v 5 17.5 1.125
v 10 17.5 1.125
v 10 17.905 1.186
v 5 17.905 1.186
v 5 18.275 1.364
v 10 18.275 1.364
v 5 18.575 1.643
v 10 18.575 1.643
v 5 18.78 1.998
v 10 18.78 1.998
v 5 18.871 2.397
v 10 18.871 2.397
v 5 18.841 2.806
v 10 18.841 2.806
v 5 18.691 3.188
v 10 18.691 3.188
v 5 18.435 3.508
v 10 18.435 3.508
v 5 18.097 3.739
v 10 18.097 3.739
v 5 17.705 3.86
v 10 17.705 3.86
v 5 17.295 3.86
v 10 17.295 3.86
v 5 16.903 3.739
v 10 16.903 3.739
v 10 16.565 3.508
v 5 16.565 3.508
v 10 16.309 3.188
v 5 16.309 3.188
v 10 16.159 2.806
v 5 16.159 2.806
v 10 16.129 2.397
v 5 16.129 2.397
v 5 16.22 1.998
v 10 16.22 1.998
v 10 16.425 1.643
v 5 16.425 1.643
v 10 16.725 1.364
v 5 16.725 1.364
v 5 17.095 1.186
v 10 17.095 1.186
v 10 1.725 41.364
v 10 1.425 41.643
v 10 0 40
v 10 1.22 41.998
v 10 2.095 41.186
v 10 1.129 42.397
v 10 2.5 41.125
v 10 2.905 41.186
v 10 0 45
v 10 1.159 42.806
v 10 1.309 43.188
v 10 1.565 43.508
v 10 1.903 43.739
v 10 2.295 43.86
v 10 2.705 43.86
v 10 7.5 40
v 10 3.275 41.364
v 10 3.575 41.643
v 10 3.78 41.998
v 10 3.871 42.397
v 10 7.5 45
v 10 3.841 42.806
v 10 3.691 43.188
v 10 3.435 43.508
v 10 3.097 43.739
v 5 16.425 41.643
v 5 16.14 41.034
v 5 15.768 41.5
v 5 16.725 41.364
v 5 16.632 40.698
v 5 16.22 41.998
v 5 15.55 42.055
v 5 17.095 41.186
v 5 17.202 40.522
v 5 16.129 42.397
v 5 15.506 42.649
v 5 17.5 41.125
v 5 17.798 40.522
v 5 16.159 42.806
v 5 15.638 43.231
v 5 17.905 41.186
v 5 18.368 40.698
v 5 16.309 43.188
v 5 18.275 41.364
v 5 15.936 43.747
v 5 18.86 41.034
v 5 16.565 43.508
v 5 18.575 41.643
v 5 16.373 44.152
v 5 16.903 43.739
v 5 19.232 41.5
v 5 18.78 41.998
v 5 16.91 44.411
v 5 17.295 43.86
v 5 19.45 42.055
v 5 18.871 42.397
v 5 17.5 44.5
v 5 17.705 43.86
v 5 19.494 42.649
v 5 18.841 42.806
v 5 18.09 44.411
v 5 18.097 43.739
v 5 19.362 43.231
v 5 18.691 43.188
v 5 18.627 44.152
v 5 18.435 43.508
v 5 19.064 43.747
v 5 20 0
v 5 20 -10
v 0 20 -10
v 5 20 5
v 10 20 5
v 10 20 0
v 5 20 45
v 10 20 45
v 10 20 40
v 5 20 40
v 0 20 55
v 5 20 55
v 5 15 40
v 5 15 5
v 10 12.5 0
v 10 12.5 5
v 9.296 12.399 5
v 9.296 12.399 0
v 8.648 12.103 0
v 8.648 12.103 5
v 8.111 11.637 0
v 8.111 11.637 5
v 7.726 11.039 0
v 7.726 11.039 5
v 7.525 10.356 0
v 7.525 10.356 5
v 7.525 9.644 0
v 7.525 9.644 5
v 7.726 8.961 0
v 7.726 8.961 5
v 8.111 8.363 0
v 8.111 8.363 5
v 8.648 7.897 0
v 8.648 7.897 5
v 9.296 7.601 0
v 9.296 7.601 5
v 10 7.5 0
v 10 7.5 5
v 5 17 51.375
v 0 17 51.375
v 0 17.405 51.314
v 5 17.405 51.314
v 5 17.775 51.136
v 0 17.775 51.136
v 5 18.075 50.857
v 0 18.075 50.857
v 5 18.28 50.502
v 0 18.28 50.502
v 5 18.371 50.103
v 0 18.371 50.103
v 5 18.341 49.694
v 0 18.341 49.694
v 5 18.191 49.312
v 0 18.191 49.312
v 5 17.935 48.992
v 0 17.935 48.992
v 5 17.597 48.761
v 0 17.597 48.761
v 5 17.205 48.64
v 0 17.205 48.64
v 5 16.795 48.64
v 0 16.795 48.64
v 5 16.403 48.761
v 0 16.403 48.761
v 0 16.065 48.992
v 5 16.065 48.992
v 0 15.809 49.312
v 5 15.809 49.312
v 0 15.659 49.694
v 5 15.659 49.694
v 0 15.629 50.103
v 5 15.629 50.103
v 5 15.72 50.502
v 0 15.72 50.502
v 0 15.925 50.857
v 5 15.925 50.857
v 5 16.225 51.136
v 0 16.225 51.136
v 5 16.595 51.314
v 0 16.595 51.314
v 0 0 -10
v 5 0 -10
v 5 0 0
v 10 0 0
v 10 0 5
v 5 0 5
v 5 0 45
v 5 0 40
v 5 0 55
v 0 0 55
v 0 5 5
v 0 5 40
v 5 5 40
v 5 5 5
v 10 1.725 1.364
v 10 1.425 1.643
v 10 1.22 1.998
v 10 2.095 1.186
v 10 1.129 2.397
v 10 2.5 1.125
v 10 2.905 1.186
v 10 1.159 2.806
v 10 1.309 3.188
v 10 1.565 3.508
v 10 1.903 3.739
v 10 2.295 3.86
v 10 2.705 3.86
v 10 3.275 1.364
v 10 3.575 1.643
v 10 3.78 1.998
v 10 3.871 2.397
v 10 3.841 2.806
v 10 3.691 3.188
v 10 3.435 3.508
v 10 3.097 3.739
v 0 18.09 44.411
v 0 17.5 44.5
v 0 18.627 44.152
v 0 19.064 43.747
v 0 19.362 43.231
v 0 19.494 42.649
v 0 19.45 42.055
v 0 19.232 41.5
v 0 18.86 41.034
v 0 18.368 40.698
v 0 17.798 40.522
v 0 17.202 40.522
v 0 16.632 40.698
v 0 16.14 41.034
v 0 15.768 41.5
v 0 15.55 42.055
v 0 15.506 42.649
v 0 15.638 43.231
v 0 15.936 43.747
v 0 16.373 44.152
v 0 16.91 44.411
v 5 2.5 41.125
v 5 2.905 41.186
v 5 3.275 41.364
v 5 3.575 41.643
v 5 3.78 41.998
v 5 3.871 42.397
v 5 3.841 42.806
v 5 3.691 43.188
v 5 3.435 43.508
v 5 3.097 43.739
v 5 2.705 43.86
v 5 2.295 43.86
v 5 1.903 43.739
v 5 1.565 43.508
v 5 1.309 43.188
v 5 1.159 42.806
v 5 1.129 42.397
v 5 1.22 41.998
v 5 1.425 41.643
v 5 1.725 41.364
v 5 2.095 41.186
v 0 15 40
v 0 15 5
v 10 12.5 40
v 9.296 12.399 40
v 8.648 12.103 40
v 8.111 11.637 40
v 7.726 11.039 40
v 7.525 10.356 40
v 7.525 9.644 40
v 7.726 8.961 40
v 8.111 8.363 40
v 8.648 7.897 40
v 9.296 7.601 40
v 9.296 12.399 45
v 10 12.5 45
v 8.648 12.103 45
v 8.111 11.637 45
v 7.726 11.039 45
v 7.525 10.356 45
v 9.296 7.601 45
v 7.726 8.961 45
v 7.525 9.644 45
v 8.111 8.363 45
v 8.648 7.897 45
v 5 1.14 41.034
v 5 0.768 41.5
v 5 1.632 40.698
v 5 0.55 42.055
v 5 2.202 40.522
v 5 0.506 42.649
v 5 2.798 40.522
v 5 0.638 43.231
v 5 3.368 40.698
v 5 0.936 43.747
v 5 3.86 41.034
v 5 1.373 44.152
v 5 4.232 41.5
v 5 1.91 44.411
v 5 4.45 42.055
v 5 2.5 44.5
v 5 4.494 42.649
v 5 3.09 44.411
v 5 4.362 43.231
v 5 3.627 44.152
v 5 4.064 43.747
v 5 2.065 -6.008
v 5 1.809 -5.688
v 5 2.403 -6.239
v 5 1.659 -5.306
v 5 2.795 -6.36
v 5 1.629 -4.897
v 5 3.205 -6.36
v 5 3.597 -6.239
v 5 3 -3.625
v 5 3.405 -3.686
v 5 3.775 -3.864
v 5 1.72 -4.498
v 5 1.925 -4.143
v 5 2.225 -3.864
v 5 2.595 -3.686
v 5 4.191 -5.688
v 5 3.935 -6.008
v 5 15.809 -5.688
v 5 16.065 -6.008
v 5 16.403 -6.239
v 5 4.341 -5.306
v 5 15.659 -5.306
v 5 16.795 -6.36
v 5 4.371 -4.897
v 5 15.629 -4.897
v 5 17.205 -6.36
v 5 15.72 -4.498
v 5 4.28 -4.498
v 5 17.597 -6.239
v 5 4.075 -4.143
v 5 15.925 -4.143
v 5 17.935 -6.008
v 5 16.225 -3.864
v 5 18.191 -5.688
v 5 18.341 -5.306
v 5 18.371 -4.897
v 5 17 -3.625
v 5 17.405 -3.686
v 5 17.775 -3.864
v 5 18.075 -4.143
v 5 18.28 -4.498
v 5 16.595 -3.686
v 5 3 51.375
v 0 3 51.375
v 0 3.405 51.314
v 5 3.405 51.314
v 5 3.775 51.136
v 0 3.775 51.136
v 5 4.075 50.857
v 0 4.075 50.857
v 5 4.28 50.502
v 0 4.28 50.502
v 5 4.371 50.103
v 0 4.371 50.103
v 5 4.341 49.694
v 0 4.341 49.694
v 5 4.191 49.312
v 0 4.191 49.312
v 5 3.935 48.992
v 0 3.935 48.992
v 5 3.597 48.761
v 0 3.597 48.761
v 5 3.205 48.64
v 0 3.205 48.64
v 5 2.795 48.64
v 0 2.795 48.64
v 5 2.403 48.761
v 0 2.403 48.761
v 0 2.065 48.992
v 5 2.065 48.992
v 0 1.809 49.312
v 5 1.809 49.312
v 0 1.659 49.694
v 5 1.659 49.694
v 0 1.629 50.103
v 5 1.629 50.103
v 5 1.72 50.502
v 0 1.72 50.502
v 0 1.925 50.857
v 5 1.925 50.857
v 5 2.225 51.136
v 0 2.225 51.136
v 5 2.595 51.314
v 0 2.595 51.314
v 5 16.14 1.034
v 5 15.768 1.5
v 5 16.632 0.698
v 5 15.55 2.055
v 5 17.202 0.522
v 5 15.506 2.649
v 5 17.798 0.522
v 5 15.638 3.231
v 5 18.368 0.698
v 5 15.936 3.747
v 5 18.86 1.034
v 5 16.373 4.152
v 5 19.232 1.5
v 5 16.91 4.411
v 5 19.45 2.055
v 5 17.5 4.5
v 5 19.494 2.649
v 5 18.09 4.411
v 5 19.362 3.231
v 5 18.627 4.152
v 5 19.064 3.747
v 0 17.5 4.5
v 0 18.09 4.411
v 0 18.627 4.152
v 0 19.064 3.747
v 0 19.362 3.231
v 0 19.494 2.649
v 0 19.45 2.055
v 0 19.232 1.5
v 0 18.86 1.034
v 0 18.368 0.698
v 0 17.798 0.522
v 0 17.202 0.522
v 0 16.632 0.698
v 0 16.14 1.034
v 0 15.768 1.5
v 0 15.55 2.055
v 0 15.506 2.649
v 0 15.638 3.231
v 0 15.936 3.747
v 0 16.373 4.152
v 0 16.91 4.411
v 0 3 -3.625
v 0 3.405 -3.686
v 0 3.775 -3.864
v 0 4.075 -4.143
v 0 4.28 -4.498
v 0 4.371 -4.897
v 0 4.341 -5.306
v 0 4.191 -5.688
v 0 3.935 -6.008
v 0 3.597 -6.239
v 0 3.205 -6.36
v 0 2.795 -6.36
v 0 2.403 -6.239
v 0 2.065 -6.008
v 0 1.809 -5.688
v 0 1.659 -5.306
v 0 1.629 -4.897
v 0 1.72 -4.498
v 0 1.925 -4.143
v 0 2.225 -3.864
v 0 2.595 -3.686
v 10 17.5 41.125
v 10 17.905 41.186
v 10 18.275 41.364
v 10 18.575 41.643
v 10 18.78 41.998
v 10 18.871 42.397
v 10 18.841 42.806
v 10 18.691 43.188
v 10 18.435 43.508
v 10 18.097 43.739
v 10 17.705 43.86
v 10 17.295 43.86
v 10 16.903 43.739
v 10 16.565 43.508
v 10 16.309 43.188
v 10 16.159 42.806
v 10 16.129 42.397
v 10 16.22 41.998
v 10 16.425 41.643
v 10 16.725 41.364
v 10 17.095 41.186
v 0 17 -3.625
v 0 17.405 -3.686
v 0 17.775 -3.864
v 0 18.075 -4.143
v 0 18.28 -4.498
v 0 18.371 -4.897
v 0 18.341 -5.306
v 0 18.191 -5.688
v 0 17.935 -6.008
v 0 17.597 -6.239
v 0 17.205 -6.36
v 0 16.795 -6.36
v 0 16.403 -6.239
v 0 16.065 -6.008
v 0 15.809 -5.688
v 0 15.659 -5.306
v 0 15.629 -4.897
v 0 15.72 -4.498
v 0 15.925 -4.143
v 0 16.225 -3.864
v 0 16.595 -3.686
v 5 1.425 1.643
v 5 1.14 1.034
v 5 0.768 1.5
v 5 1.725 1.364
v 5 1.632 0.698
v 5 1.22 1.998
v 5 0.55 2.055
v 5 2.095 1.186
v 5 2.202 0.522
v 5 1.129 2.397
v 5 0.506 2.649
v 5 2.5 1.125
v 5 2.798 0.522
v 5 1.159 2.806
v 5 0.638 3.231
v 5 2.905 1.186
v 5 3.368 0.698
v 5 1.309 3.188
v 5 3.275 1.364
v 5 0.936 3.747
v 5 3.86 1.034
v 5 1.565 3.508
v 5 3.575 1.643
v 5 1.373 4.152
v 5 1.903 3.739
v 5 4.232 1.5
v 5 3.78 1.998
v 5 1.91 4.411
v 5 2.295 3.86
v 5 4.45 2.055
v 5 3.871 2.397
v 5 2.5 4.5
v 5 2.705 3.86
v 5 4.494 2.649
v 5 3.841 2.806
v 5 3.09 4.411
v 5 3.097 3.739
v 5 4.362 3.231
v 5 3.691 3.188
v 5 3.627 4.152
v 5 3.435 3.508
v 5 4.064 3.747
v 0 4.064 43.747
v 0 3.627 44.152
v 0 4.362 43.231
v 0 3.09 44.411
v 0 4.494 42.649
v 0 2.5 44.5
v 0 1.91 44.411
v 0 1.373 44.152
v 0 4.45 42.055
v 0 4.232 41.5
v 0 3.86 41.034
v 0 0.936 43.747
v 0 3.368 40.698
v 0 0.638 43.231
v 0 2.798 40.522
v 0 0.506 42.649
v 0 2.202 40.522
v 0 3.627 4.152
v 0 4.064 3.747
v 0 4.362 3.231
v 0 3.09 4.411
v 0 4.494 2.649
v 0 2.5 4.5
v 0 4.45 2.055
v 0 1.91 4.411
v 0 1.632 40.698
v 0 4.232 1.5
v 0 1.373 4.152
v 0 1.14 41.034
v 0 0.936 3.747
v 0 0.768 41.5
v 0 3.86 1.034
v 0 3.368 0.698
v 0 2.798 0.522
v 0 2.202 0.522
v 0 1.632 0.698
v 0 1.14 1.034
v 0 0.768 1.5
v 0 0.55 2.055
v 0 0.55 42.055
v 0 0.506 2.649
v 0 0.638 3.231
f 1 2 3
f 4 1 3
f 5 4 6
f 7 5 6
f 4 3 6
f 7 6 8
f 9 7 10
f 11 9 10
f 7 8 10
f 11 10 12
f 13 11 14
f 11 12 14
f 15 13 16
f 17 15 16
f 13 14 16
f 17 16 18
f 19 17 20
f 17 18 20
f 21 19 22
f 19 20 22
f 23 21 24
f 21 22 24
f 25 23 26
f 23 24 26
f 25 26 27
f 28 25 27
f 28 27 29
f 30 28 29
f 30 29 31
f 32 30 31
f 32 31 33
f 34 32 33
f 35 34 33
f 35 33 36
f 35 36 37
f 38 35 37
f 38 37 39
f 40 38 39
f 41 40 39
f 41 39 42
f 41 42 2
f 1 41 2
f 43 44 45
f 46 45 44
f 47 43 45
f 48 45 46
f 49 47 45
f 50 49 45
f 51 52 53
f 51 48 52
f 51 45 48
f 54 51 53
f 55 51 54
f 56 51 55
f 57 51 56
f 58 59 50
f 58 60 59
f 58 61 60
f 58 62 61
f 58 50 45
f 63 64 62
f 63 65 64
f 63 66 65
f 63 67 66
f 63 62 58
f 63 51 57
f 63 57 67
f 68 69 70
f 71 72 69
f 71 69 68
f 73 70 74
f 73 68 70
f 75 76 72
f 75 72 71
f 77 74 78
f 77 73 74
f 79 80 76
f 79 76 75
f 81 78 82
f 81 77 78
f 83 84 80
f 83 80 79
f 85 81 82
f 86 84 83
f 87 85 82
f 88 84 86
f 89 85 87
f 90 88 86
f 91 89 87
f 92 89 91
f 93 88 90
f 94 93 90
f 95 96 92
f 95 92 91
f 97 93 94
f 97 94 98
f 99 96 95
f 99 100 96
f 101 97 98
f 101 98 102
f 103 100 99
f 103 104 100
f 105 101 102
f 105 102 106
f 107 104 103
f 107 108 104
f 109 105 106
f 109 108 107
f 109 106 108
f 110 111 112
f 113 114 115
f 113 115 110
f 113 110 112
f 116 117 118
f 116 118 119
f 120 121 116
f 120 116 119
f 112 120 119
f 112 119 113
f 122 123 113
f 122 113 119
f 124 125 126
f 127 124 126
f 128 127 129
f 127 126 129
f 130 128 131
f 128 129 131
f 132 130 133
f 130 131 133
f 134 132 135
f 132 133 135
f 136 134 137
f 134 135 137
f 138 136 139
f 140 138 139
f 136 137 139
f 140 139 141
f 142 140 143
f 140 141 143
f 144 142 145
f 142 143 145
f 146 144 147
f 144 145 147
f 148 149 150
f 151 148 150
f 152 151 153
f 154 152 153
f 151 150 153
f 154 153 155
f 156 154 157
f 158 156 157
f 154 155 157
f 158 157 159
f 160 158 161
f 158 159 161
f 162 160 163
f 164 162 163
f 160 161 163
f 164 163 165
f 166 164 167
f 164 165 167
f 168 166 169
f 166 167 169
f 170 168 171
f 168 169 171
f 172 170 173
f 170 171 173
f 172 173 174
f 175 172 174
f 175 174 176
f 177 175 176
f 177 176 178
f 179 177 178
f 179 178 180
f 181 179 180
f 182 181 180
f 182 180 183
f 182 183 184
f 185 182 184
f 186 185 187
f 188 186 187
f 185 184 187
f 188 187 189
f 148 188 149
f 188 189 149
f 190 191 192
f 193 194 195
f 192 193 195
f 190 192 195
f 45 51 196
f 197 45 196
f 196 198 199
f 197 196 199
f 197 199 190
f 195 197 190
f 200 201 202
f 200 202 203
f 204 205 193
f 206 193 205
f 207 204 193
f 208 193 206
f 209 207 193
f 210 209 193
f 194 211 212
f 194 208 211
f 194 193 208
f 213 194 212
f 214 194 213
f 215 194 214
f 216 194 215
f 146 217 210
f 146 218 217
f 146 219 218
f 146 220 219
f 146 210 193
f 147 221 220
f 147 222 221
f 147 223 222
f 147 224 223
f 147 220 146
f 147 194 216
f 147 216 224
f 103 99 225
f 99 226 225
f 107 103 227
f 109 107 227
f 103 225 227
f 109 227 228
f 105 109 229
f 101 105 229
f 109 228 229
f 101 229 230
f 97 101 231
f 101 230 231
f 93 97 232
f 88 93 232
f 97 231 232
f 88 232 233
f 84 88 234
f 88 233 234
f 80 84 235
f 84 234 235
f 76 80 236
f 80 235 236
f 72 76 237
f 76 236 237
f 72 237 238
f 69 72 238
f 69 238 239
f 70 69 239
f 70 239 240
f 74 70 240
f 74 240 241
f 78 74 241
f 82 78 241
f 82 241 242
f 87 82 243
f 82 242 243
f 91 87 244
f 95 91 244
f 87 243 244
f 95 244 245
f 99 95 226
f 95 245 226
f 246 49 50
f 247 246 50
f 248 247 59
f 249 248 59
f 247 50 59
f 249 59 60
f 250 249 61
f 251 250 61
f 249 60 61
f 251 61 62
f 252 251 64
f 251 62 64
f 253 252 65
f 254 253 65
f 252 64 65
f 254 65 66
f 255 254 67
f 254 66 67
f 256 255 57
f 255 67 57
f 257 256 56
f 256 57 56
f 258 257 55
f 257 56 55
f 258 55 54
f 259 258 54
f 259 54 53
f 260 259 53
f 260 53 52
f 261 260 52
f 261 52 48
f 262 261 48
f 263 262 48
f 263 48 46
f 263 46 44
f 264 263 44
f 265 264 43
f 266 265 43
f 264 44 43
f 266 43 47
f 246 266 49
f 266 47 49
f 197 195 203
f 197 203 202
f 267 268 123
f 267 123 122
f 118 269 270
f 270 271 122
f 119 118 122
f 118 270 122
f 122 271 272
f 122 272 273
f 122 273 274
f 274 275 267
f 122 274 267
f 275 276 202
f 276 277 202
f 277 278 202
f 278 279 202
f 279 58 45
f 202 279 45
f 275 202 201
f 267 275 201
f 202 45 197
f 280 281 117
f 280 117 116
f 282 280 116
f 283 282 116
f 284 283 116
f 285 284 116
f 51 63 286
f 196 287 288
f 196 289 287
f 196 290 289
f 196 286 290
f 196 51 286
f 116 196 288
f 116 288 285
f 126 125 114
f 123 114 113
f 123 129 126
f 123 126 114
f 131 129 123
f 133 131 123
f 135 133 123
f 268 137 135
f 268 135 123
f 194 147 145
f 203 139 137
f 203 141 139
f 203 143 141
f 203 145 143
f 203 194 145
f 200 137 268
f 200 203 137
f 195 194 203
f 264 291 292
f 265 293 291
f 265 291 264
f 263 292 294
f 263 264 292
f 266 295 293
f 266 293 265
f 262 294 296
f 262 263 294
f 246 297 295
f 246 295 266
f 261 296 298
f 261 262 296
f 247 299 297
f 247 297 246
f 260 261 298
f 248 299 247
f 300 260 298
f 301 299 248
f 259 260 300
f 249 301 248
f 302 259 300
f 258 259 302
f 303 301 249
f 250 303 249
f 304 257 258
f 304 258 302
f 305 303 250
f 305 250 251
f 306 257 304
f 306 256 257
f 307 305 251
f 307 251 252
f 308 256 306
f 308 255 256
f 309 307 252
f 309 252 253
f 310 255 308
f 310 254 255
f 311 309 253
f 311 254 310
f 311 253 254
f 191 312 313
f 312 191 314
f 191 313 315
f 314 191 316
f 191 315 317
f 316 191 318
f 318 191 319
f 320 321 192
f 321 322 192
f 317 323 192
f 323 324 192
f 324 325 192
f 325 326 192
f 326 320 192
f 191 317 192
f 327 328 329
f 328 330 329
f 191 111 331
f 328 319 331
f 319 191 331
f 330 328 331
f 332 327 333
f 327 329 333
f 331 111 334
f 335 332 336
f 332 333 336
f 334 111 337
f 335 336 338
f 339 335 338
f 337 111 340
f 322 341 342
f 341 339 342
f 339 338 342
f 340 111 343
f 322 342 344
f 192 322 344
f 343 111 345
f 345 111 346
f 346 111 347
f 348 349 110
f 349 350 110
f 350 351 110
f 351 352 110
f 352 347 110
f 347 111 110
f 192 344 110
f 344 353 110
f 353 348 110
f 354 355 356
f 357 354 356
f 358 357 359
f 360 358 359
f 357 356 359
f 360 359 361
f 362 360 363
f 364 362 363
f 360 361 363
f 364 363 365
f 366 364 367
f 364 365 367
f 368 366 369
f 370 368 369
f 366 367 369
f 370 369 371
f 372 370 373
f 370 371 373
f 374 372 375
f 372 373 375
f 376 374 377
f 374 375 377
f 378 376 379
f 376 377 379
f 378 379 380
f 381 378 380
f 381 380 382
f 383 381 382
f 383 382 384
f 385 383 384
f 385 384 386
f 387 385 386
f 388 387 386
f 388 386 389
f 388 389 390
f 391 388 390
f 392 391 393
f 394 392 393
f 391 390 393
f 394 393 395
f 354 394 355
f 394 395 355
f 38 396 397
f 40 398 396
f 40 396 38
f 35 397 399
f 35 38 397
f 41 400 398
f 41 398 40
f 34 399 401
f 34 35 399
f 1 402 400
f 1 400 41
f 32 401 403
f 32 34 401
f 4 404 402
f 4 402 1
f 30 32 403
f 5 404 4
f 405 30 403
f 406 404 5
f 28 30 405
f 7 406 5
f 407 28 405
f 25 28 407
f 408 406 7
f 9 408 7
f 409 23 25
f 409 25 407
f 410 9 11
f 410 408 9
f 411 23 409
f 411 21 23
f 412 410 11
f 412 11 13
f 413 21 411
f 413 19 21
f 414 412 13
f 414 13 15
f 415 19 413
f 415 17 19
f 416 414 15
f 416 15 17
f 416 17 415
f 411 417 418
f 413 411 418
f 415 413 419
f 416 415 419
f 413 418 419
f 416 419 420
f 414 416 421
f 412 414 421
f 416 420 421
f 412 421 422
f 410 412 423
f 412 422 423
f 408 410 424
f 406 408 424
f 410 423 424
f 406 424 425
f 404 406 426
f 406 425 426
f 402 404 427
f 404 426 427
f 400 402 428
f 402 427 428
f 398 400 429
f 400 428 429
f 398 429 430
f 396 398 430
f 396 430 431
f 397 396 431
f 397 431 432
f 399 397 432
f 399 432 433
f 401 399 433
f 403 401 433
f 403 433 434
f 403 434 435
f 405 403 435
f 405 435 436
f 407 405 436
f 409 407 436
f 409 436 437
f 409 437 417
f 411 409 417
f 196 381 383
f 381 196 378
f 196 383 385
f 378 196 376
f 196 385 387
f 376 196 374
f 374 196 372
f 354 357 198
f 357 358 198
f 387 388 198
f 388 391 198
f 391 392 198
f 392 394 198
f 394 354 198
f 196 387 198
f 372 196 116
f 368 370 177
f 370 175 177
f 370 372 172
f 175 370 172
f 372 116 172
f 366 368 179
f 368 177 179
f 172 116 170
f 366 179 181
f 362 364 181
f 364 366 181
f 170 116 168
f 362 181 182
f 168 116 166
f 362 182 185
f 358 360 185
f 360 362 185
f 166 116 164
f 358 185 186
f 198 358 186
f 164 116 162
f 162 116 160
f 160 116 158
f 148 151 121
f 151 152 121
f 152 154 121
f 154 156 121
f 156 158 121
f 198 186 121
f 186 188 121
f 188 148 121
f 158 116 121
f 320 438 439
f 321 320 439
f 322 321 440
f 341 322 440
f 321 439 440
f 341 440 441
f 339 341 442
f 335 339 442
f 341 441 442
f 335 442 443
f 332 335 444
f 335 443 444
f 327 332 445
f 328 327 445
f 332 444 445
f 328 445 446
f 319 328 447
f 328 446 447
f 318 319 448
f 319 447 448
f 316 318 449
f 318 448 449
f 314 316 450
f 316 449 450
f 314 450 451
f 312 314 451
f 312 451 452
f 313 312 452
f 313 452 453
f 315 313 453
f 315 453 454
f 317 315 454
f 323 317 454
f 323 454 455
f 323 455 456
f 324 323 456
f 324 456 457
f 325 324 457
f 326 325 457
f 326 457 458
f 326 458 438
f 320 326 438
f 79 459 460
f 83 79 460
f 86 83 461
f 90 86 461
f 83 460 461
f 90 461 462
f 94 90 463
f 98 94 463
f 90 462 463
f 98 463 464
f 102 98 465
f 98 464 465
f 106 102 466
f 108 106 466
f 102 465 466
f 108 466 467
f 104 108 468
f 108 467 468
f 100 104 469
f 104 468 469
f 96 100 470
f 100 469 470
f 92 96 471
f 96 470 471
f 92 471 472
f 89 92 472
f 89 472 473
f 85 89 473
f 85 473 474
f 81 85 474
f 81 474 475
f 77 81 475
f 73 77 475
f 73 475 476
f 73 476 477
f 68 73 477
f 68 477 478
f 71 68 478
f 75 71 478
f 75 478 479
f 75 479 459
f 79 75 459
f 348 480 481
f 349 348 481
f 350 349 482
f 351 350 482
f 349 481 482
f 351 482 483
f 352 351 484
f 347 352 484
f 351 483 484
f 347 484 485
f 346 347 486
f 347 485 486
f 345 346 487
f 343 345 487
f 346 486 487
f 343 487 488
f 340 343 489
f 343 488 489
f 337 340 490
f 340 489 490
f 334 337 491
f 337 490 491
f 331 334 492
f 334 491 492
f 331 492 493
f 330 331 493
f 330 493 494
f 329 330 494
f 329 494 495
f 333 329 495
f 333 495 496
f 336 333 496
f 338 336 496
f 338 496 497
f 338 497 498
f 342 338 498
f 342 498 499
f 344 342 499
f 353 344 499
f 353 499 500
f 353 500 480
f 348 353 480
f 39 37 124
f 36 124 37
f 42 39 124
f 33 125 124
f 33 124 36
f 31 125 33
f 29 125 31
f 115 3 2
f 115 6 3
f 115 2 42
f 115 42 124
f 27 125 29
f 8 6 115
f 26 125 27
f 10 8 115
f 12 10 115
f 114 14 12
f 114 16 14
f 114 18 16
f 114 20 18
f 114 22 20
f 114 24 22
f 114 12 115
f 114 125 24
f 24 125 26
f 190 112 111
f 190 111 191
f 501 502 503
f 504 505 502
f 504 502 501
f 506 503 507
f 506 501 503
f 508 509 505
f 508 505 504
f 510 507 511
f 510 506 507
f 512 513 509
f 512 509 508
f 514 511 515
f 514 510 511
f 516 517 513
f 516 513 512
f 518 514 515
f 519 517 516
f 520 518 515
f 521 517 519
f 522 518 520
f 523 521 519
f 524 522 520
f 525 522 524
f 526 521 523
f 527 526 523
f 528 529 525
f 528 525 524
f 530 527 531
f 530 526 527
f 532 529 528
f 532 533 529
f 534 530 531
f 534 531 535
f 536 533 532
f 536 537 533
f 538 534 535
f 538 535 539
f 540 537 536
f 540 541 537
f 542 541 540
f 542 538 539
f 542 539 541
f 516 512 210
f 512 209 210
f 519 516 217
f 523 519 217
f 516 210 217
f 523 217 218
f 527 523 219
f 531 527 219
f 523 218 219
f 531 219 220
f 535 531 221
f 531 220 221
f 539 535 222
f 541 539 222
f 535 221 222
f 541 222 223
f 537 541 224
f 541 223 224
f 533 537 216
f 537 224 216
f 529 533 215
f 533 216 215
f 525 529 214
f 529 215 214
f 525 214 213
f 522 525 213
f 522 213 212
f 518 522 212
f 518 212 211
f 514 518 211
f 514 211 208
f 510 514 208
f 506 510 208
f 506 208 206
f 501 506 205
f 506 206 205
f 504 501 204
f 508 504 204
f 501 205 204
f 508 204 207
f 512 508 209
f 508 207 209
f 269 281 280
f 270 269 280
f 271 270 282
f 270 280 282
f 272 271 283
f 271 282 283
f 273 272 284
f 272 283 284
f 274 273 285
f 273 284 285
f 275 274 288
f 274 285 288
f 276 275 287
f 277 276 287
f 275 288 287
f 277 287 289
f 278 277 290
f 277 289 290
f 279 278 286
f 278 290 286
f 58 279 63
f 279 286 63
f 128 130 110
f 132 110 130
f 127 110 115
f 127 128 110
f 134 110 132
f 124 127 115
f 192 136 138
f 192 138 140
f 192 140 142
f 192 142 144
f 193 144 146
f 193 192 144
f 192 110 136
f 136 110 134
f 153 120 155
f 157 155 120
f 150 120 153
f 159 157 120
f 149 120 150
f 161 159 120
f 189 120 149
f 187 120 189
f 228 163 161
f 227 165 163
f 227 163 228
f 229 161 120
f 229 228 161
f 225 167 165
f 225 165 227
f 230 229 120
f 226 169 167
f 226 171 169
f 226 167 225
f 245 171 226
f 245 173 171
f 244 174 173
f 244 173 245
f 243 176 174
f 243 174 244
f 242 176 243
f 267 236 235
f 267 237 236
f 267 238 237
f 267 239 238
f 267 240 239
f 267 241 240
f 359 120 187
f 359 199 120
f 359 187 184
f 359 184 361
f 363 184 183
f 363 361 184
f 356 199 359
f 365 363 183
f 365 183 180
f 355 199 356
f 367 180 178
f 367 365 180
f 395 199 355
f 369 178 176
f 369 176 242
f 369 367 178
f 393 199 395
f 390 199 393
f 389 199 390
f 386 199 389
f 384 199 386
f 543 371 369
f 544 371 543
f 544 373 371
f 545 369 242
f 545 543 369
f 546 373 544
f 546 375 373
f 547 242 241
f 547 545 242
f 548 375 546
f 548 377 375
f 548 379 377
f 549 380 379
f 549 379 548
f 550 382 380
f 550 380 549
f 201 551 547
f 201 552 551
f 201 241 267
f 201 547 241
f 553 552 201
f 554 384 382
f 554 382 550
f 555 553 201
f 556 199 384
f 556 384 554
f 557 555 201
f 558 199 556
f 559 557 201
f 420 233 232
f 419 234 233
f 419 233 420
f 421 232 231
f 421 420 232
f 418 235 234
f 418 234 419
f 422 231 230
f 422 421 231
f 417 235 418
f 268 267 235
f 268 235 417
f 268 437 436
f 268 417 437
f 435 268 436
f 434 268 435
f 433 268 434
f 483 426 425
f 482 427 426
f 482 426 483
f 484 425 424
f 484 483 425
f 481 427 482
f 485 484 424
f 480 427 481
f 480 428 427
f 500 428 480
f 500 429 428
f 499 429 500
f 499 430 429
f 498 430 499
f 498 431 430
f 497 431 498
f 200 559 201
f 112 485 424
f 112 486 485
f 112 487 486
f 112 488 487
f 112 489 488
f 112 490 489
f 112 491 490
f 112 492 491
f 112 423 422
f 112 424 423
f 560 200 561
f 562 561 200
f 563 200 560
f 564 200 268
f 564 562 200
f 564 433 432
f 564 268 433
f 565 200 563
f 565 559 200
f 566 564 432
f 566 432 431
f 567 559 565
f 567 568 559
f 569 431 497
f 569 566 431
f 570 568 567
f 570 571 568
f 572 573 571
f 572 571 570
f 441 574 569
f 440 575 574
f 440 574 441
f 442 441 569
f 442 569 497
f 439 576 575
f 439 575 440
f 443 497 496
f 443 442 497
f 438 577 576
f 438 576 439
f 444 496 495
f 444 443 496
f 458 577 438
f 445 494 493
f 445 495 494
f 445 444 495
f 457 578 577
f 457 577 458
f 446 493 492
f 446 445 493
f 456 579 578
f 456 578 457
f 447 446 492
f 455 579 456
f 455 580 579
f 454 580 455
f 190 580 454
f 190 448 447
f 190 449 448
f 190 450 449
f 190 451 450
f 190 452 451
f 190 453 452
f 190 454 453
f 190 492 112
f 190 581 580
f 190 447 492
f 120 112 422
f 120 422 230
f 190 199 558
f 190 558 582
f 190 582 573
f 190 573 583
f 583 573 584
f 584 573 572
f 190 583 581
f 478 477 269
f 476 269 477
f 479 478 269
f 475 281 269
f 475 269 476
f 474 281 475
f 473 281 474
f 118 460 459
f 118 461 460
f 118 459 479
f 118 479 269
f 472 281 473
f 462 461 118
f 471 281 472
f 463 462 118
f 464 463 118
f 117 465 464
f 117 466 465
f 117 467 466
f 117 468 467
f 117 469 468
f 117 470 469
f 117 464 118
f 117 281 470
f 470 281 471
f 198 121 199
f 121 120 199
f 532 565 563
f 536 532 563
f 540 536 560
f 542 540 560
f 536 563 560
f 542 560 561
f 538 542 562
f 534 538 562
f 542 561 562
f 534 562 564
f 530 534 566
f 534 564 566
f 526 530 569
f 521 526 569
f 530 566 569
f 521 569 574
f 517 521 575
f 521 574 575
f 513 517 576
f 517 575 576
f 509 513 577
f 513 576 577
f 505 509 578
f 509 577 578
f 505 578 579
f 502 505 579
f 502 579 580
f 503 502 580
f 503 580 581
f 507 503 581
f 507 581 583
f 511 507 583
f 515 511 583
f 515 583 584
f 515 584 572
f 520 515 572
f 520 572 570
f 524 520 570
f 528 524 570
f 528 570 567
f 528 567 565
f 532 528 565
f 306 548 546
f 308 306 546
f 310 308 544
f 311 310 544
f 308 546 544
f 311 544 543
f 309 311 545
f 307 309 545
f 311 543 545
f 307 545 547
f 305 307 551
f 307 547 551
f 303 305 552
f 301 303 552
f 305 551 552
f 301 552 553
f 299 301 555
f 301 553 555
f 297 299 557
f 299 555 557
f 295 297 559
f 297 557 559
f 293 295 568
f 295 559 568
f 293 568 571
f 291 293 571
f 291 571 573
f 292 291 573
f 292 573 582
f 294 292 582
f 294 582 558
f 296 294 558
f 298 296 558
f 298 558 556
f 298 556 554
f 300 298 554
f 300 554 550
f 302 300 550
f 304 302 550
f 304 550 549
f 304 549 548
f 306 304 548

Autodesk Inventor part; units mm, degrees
ref_plane "YZ Plane" through (0, 0, 0) normal (1, 0, 0) x (0, 1, 0)
ref_plane "XZ Plane" through (0, 0, 0) normal (0, 1, 0) x (-1, 0, 0)
ref_plane "XY Plane" through (0, 0, 0) normal (0, 0, 1) x (1, 0, 0)
sketch "Sketch1" plane through (0, 0, 0) normal (0, 1, 0) x (-1, 0, 0)
  line L0 (0, 0) -> (-5, 0)
  line L1 (-5, 0) -> (-5, 45)
  line L2 (-5, 45) -> (0, 45)
  line L3 (0, 45) -> (0, 0)
  line L4 (-5, 45) -> (-20, 45)
  line L5 (-20, 45) -> (-20, 40)
  line L6 (-20, 40) -> (-5, 40)
  line L7 (-5, 40) -> (-5, 45)
  line L8 (-5, 0) -> (-20, 0)
  line L9 (-20, 0) -> (-20, 5)
  line L10 (-20, 5) -> (-5, 5)
  line L11 (-5, 5) -> (-5, 0)
  point P0 (-5, 40)
  point P1 (-5, 5)
  dimension "d0" = 5
  dimension "d1" = 5
  dimension "d2" = 5
  dimension "d3" = 15
  dimension "d4" = 15
  dimension "d5" = 35
extrude "Extrusion1" add sketch "Sketch1" along normal blind 20
sketch "Sketch2" plane through (0, 0, 45) normal (0, 0, 1) x (1, 0, 0)
  circle A0 centre (10, 10) radius 2.5
  line L0 (20, 0) -> (20, 20) projected
  line L1 (20, 0) -> (10, 0)
  line L2 (10, 0) -> (10, 20)
  line L3 (10, 20) -> (20, 20)
  line L4 (20, 20) -> (20, 0)
  line L5 (0, 0) -> (20, 0) projected
  dimension "d8" = 10
  dimension "d9" = 10
  dimension "d10" = 10
  dimension "d11" = 5
extrude "Extrusion2" cut sketch "Sketch2" against normal blind 200
sketch "Sketch3" plane through (0, 0, 0) normal (-1, 0, 0) x (0, 0, 1)
  line L0 (5, 0) -> (5, 20) projected
  line L1 (40, 0) -> (40, 20) projected
  line L2 (5, 15) -> (40, 15)
  line L3 (40, 15) -> (40, 5)
  line L4 (40, 5) -> (5, 5)
  line L5 (5, 5) -> (5, 15)
  line L6 (0, 20) -> (45, 20) projected
  line L7 (0, 0) -> (45, 0) projected
  point P0 (5, 5)
  dimension "d14" = 5
  dimension "d15" = 5
extrude "Extrusion3" cut sketch "Sketch3" against normal blind 20 contours L0 L2 L1 L4
sketch "Sketch4" plane through (0, 0, 0) normal (-1, 0, 0) x (0, 0, 1)
  line L0 (45, 0) -> (45, 20) projected
  line L1 (45, 20) -> (55, 20)
  line L2 (55, 20) -> (55, 0)
  line L3 (55, 0) -> (45, 0)
  line L4 (45, 0) -> (45, 20)
  line L5 (0, 20) -> (0, 12.5) projected
  line L6 (0, 20) -> (-10, 20)
  line L7 (-10, 20) -> (-10, 0)
  line L8 (-10, 0) -> (0, 0)
  line L9 (0, 0) -> (0, 20)
  circle A0 centre (50, 3) radius 1.375
  circle A1 centre (50, 17) radius 1.375
  circle A2 centre (-5, 17) radius 1.375
  circle A3 centre (-5, 3) radius 1.375
  point P0 (0, 0)
  point P1 (50, 20)
  point P2 (0, 12.5)
  dimension "d18" = 10
  dimension "d19" = 10
  dimension "d20" = 3
  dimension "d21" = 3
  dimension "d22" = 5
  dimension "d23" = 5
  dimension "d24" = 5
  dimension "d25" = 5
  dimension "d26" = 3
  dimension "d27" = 3
  dimension "d28" = 2.75
  dimension "d29" = 2.75
  dimension "d30" = 2.75
  dimension "d31" = 2.75
extrude "Extrusion4" add sketch "Sketch4" against normal blind 5
sketch "Sketch5" plane through (10, 12.5, 45) normal (1, 0, 0) x (0, 0, -1)
  circle A0 centre (42.5, 5) radius 1.375
  circle A1 centre (42.5, -10) radius 1.375
  circle A2 centre (2.5, 5) radius 1.375
  circle A3 centre (2.5, -10) radius 1.375
  line L0 (40, 7.5) -> (45, 7.5) projected
  line L1 (45, 7.5) -> (45, 0) projected
  line L2 (45, -5) -> (45, -12.5) projected
  line L3 (45, -12.5) -> (40, -12.5) projected
  line L4 (5, -12.5) -> (0, -12.5) projected
  line L5 (0, -12.5) -> (0, -5) projected
  line L6 (0, 0) -> (0, 7.5) projected
  line L7 (0, 7.5) -> (5, 7.5) projected
  dimension "d34" = 2.5
  dimension "d35" = 2.5
  dimension "d36" = 2.5
  dimension "d37" = 2.5
  dimension "d38" = 2.5
  dimension "d39" = 2.5
  dimension "d40" = 2.5
  dimension "d41" = 2.5
  dimension "d42" = 2.75
  dimension "d43" = 2.75
  dimension "d44" = 2.75
  dimension "d45" = 2.75
extrude "Extrusion5" cut sketch "Sketch5" against normal blind 15
sketch "Sketch6" plane through (0, 0, 55) normal (-1, 0, 0) x (0, 0, 1)
  circle A0 centre (-12.5, 17.5) radius 1.375 projected
  circle A1 centre (-12.5, 17.5) radius 2
  circle A2 centre (-12.5, 2.5) radius 1.375 projected
  circle A3 centre (-12.5, 2.5) radius 2
  circle A4 centre (-52.5, 2.5) radius 1.375 projected
  circle A5 centre (-52.5, 2.5) radius 2
  circle A6 centre (-52.5, 17.5) radius 1.375 projected
  circle A7 centre (-52.5, 17.5) radius 2
  point P0 (-55, 0)
  dimension "d48" = 4
  dimension "d49" = 4
  dimension "d50" = 4
  dimension "d51" = 4
extrude "Extrusion6" cut sketch "Sketch6" against normal blind 5 contours A0 | A1 | A2 | A3 | A4 | A5 | A6 | A7
equation "\"d14\" = d15"
equation "\"d19\" = d18"
equation "\"d20\" = d21"
equation "\"d24\" = d23"
equation "\"d25\" = d22"
equation "\"d26\" = d20"
equation "\"d27\" = d21"
equation "\"d34\" = d35"
equation "\"d37\" = d34"
equation "\"d38\" = d34"
equation "\"d39\" = d36"
equation "\"d40\" = d39"
equation "\"d41\" = d34"
equation "\"d44\" = d42"
equation "\"d45\" = d43"
equation "\"d49\" = d48"
equation "\"d50\" = d49"
equation "\"d51\" = d48"
properties part number "MotorDifferentialMountingBracket"
